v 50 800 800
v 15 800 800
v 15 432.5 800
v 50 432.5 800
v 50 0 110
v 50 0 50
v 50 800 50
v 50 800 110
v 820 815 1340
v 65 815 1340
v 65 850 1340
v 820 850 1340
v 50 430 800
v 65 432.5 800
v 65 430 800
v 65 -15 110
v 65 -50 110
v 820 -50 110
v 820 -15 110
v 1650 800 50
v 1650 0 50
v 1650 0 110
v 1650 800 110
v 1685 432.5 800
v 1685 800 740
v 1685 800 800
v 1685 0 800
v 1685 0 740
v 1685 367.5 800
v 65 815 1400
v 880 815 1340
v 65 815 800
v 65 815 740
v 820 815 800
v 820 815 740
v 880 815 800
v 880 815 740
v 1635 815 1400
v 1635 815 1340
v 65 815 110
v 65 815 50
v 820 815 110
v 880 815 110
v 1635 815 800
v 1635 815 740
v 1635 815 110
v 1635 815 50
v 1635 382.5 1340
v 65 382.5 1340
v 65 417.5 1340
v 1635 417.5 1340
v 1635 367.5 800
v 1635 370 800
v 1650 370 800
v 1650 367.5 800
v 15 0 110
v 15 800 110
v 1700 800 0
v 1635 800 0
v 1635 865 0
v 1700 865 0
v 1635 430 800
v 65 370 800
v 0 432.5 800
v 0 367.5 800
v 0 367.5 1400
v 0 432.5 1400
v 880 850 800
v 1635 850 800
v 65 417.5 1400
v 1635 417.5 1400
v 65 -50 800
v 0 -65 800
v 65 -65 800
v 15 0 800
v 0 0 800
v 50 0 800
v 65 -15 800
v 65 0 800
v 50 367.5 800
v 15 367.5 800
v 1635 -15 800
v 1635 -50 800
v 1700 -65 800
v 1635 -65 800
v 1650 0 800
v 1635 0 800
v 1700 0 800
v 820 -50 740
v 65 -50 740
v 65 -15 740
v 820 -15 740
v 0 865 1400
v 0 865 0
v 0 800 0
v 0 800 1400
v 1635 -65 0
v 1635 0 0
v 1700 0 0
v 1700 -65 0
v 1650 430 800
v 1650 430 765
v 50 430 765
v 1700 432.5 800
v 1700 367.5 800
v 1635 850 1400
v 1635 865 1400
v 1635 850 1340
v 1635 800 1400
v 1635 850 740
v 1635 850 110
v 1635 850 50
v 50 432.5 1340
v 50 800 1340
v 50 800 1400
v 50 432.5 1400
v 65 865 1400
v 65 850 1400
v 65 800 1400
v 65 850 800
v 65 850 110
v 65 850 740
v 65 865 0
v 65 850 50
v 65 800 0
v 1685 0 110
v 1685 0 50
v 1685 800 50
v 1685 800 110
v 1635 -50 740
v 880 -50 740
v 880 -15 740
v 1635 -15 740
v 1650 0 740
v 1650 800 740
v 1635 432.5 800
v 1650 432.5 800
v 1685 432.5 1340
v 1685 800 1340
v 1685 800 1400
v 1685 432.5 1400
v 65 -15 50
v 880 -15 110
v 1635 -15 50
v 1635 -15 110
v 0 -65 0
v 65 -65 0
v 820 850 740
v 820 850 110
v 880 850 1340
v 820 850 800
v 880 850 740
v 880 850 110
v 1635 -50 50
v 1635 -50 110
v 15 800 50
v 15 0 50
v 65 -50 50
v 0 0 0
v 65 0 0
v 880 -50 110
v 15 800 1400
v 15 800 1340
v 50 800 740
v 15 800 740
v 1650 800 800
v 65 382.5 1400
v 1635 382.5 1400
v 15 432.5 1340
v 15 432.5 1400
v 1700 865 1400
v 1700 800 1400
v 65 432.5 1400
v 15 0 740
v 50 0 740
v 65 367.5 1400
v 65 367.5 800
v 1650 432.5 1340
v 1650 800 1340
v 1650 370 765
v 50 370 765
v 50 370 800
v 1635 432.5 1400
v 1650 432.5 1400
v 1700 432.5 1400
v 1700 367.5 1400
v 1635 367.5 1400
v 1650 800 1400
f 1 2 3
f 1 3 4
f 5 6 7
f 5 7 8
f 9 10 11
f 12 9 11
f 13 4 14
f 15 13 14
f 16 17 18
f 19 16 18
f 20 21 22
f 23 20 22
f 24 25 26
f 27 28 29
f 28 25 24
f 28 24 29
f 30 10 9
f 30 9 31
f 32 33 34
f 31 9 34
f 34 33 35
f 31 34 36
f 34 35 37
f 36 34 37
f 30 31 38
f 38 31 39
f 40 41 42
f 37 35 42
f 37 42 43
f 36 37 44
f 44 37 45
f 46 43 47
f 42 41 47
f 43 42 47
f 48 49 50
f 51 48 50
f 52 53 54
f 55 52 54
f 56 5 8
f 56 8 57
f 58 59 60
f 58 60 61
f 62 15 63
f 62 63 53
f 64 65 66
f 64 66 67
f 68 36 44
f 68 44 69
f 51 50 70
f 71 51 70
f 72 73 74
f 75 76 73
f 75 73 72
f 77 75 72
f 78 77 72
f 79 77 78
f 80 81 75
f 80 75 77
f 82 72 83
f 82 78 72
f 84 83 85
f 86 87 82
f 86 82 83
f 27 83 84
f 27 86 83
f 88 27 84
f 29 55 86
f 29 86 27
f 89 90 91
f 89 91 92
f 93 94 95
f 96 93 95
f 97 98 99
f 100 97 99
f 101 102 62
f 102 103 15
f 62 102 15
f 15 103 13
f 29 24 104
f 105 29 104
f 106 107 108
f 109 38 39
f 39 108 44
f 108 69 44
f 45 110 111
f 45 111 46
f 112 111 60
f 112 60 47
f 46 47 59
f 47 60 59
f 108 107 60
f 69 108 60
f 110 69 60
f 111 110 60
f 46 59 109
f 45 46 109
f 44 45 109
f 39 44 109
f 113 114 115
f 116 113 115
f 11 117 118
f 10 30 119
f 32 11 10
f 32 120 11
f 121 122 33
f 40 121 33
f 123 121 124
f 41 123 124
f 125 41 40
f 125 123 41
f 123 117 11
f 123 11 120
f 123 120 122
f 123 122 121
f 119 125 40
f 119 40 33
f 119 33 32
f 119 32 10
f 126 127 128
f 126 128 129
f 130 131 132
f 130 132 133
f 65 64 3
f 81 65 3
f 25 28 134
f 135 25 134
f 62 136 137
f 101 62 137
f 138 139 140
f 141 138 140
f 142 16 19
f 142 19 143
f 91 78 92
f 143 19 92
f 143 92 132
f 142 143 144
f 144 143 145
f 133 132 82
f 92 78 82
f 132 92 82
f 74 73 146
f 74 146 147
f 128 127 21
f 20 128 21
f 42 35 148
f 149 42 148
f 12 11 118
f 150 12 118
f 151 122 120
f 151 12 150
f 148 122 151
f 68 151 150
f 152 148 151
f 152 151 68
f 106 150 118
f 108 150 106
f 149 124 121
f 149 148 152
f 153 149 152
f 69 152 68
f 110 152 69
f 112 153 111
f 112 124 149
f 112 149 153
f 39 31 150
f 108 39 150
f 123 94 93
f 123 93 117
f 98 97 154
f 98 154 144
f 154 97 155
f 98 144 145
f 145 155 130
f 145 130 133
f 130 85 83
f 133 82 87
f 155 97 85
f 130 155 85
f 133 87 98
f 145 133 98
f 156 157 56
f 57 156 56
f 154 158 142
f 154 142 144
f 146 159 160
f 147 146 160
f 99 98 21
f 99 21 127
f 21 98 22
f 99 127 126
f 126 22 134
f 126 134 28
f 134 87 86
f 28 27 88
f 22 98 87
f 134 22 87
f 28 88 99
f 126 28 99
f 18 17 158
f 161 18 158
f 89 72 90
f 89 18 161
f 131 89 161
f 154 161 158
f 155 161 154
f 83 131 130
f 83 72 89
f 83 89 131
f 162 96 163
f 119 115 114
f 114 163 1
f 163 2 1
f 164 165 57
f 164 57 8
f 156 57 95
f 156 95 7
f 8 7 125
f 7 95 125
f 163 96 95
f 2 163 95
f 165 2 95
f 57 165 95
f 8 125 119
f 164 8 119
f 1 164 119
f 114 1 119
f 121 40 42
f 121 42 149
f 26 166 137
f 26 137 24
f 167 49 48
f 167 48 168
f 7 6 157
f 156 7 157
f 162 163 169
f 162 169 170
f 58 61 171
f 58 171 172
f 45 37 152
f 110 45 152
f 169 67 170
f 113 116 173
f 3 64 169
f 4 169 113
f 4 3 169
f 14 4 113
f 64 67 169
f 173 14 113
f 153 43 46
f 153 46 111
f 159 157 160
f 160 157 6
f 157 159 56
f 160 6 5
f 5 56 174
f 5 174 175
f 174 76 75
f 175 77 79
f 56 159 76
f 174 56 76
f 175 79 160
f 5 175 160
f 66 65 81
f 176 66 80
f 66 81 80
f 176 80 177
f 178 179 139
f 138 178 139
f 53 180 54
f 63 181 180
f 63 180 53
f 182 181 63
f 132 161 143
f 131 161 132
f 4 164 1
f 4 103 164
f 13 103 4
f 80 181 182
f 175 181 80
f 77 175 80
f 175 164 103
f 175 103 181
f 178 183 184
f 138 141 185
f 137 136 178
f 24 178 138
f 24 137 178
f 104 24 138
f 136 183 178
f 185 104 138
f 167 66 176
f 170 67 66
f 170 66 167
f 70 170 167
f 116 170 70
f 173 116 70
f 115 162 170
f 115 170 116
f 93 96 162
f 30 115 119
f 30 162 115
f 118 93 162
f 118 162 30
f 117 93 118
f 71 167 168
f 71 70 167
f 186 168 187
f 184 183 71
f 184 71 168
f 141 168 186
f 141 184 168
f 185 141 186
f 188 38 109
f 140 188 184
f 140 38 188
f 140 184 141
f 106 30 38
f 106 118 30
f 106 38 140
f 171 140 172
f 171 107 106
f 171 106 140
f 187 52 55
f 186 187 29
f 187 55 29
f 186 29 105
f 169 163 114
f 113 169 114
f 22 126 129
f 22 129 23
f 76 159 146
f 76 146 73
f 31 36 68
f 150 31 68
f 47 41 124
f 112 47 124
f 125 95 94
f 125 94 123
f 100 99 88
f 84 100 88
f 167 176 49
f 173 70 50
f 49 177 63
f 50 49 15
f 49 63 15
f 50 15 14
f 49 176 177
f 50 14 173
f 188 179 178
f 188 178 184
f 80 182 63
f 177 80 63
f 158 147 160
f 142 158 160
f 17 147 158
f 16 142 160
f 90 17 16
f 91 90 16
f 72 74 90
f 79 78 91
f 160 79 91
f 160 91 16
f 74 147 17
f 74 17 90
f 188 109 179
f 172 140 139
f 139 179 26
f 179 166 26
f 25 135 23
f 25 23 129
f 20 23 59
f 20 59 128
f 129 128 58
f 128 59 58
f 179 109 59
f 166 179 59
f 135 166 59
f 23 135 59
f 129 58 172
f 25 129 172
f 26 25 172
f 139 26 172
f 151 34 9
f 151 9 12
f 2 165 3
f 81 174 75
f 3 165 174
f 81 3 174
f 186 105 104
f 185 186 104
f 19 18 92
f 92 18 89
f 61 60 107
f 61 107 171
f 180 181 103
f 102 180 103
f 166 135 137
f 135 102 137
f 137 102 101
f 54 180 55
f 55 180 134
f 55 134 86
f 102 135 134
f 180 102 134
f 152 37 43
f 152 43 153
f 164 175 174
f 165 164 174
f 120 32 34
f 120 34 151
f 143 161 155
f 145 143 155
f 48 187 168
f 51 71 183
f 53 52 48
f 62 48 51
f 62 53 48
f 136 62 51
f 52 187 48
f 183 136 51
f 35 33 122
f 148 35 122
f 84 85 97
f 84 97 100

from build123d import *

# Parameters (mm, degrees)
F0_W      = 1700
F0_H      = 800
F1_DEPTH  = 65
F2_W      = 1570
F2_H      = 15
F3_DEPTH  = 800.001
F4_W      = 1570
F4_H      = 50
F4_W_2    = 755
F4_H_2    = 630
F5_DEPTH  = 50.001
F6_W      = 35
F6_H      = 60
F7_DEPTH  = 800
F8_W      = 65
F8_H      = 65
F9_DEPTH  = 1400
F10_W     = 35
F10_H     = 60
F11_DEPTH = 1570
F12_W     = 60
F12_H     = 35
F13_DEPTH = 1230
F14_W     = 60
F14_H     = 35
F15_DEPTH = 1600
F16_W     = 65
F16_H     = 65
F17_DEPTH = 600
F18_W     = 35
F18_H     = 60
F19_DEPTH = 367.5
F20_W     = 35
F20_H     = 60
F21_DEPTH = 1570


with BuildPart() as f1:
    # F0 (on Front) → F1 (new body)
    with BuildSketch(Plane.XZ):
        with Locations((850, 400)):
            Rectangle(F0_W, F0_H)
    extrude(amount=F1_DEPTH)

    # F2 (on face) → F3 (cut, through all)
    with BuildSketch(Plane.XY.offset(800)):
        with Locations((850, -57.5)):
            Rectangle(F2_W, F2_H)
        with Locations((850, -7.5)):
            Rectangle(F2_W, F2_H)
    extrude(amount=-F3_DEPTH, mode=Mode.SUBTRACT)

    # F4 (on face) → F5 (cut, through all)
    with BuildSketch(Plane.XZ.offset(50)):
        with Locations((850, 25)):
            Rectangle(F4_W, F4_H)
        with Locations((1257.5, 425)):
            Rectangle(F4_W_2, F4_H_2)
        with Locations((442.5, 425)):
            Rectangle(F4_W_2, F4_H_2)
    extrude(amount=-F5_DEPTH, mode=Mode.SUBTRACT)

    # F6 (on face) → F7 (join)
    with BuildSketch(Plane(origin=(0, 0, 0), x_dir=(-1, 0, 0), z_dir=(0, 1, 0))):
        with Locations((-1667.5, 770)):
            Rectangle(F6_W, F6_H)
        with Locations((-1667.5, 80)):
            Rectangle(F6_W, F6_H)
        with Locations((-32.5, 770)):
            Rectangle(F6_W, F6_H)
        with Locations((-32.5, 80)):
            Rectangle(F6_W, F6_H)
    extrude(amount=F7_DEPTH)

    # F8 (on face) → F9 (join)
    with BuildSketch(Plane(origin=(0, 0, 0), x_dir=(1, 0, 0), z_dir=(0, 0, -1))):
        with Locations((1667.5, -832.5)):
            Rectangle(F8_W, F8_H)
        with Locations((32.5, -832.5)):
            Rectangle(F8_W, F8_H)
    extrude(amount=-F9_DEPTH)

    # F10 (on face) → F11 (join)
    with BuildSketch(Plane.YZ.offset(65)):
        with Locations((832.5, 1370)):
            Rectangle(F10_W, F10_H)
        with Locations((832.5, 80)):
            Rectangle(F10_W, F10_H)
        with Locations((832.5, 770)):
            Rectangle(F10_W, F10_H)
    extrude(amount=F11_DEPTH)

    # F12 (on face) → F13 (join, through all)
    with BuildSketch(Plane.XY.offset(110)):
        with Locations((850, 832.5)):
            Rectangle(F12_W, F12_H)
    extrude(amount=F13_DEPTH)

    # F14 (on face) → F15 (join, through all)
    with BuildSketch(Plane.YZ.offset(50)):
        with Locations((400, 782.5)):
            Rectangle(F14_W, F14_H)
    extrude(amount=F15_DEPTH)

    # F16 (on face) → F17 (join)
    with BuildSketch(Plane.XY.offset(800)):
        with Locations((32.5, 400)):
            Rectangle(F16_W, F16_H)
        with Locations((1667.5, 400)):
            Rectangle(F16_W, F16_H)
    extrude(amount=F17_DEPTH)

    # F18 (on face) → F19 (join, through all)
    with BuildSketch(Plane.XZ.offset(-800)):
        with Locations((1667.5, 1370)):
            Rectangle(F18_W, F18_H)
        with Locations((32.5, 1370)):
            Rectangle(F18_W, F18_H)
    extrude(amount=F19_DEPTH)

    # F20 (on face) → F21 (join, through all)
    with BuildSketch(Plane.YZ.offset(65)):
        with Locations((400, 1370)):
            Rectangle(F20_W, F20_H)
    extrude(amount=F21_DEPTH)


solid = f1.part
